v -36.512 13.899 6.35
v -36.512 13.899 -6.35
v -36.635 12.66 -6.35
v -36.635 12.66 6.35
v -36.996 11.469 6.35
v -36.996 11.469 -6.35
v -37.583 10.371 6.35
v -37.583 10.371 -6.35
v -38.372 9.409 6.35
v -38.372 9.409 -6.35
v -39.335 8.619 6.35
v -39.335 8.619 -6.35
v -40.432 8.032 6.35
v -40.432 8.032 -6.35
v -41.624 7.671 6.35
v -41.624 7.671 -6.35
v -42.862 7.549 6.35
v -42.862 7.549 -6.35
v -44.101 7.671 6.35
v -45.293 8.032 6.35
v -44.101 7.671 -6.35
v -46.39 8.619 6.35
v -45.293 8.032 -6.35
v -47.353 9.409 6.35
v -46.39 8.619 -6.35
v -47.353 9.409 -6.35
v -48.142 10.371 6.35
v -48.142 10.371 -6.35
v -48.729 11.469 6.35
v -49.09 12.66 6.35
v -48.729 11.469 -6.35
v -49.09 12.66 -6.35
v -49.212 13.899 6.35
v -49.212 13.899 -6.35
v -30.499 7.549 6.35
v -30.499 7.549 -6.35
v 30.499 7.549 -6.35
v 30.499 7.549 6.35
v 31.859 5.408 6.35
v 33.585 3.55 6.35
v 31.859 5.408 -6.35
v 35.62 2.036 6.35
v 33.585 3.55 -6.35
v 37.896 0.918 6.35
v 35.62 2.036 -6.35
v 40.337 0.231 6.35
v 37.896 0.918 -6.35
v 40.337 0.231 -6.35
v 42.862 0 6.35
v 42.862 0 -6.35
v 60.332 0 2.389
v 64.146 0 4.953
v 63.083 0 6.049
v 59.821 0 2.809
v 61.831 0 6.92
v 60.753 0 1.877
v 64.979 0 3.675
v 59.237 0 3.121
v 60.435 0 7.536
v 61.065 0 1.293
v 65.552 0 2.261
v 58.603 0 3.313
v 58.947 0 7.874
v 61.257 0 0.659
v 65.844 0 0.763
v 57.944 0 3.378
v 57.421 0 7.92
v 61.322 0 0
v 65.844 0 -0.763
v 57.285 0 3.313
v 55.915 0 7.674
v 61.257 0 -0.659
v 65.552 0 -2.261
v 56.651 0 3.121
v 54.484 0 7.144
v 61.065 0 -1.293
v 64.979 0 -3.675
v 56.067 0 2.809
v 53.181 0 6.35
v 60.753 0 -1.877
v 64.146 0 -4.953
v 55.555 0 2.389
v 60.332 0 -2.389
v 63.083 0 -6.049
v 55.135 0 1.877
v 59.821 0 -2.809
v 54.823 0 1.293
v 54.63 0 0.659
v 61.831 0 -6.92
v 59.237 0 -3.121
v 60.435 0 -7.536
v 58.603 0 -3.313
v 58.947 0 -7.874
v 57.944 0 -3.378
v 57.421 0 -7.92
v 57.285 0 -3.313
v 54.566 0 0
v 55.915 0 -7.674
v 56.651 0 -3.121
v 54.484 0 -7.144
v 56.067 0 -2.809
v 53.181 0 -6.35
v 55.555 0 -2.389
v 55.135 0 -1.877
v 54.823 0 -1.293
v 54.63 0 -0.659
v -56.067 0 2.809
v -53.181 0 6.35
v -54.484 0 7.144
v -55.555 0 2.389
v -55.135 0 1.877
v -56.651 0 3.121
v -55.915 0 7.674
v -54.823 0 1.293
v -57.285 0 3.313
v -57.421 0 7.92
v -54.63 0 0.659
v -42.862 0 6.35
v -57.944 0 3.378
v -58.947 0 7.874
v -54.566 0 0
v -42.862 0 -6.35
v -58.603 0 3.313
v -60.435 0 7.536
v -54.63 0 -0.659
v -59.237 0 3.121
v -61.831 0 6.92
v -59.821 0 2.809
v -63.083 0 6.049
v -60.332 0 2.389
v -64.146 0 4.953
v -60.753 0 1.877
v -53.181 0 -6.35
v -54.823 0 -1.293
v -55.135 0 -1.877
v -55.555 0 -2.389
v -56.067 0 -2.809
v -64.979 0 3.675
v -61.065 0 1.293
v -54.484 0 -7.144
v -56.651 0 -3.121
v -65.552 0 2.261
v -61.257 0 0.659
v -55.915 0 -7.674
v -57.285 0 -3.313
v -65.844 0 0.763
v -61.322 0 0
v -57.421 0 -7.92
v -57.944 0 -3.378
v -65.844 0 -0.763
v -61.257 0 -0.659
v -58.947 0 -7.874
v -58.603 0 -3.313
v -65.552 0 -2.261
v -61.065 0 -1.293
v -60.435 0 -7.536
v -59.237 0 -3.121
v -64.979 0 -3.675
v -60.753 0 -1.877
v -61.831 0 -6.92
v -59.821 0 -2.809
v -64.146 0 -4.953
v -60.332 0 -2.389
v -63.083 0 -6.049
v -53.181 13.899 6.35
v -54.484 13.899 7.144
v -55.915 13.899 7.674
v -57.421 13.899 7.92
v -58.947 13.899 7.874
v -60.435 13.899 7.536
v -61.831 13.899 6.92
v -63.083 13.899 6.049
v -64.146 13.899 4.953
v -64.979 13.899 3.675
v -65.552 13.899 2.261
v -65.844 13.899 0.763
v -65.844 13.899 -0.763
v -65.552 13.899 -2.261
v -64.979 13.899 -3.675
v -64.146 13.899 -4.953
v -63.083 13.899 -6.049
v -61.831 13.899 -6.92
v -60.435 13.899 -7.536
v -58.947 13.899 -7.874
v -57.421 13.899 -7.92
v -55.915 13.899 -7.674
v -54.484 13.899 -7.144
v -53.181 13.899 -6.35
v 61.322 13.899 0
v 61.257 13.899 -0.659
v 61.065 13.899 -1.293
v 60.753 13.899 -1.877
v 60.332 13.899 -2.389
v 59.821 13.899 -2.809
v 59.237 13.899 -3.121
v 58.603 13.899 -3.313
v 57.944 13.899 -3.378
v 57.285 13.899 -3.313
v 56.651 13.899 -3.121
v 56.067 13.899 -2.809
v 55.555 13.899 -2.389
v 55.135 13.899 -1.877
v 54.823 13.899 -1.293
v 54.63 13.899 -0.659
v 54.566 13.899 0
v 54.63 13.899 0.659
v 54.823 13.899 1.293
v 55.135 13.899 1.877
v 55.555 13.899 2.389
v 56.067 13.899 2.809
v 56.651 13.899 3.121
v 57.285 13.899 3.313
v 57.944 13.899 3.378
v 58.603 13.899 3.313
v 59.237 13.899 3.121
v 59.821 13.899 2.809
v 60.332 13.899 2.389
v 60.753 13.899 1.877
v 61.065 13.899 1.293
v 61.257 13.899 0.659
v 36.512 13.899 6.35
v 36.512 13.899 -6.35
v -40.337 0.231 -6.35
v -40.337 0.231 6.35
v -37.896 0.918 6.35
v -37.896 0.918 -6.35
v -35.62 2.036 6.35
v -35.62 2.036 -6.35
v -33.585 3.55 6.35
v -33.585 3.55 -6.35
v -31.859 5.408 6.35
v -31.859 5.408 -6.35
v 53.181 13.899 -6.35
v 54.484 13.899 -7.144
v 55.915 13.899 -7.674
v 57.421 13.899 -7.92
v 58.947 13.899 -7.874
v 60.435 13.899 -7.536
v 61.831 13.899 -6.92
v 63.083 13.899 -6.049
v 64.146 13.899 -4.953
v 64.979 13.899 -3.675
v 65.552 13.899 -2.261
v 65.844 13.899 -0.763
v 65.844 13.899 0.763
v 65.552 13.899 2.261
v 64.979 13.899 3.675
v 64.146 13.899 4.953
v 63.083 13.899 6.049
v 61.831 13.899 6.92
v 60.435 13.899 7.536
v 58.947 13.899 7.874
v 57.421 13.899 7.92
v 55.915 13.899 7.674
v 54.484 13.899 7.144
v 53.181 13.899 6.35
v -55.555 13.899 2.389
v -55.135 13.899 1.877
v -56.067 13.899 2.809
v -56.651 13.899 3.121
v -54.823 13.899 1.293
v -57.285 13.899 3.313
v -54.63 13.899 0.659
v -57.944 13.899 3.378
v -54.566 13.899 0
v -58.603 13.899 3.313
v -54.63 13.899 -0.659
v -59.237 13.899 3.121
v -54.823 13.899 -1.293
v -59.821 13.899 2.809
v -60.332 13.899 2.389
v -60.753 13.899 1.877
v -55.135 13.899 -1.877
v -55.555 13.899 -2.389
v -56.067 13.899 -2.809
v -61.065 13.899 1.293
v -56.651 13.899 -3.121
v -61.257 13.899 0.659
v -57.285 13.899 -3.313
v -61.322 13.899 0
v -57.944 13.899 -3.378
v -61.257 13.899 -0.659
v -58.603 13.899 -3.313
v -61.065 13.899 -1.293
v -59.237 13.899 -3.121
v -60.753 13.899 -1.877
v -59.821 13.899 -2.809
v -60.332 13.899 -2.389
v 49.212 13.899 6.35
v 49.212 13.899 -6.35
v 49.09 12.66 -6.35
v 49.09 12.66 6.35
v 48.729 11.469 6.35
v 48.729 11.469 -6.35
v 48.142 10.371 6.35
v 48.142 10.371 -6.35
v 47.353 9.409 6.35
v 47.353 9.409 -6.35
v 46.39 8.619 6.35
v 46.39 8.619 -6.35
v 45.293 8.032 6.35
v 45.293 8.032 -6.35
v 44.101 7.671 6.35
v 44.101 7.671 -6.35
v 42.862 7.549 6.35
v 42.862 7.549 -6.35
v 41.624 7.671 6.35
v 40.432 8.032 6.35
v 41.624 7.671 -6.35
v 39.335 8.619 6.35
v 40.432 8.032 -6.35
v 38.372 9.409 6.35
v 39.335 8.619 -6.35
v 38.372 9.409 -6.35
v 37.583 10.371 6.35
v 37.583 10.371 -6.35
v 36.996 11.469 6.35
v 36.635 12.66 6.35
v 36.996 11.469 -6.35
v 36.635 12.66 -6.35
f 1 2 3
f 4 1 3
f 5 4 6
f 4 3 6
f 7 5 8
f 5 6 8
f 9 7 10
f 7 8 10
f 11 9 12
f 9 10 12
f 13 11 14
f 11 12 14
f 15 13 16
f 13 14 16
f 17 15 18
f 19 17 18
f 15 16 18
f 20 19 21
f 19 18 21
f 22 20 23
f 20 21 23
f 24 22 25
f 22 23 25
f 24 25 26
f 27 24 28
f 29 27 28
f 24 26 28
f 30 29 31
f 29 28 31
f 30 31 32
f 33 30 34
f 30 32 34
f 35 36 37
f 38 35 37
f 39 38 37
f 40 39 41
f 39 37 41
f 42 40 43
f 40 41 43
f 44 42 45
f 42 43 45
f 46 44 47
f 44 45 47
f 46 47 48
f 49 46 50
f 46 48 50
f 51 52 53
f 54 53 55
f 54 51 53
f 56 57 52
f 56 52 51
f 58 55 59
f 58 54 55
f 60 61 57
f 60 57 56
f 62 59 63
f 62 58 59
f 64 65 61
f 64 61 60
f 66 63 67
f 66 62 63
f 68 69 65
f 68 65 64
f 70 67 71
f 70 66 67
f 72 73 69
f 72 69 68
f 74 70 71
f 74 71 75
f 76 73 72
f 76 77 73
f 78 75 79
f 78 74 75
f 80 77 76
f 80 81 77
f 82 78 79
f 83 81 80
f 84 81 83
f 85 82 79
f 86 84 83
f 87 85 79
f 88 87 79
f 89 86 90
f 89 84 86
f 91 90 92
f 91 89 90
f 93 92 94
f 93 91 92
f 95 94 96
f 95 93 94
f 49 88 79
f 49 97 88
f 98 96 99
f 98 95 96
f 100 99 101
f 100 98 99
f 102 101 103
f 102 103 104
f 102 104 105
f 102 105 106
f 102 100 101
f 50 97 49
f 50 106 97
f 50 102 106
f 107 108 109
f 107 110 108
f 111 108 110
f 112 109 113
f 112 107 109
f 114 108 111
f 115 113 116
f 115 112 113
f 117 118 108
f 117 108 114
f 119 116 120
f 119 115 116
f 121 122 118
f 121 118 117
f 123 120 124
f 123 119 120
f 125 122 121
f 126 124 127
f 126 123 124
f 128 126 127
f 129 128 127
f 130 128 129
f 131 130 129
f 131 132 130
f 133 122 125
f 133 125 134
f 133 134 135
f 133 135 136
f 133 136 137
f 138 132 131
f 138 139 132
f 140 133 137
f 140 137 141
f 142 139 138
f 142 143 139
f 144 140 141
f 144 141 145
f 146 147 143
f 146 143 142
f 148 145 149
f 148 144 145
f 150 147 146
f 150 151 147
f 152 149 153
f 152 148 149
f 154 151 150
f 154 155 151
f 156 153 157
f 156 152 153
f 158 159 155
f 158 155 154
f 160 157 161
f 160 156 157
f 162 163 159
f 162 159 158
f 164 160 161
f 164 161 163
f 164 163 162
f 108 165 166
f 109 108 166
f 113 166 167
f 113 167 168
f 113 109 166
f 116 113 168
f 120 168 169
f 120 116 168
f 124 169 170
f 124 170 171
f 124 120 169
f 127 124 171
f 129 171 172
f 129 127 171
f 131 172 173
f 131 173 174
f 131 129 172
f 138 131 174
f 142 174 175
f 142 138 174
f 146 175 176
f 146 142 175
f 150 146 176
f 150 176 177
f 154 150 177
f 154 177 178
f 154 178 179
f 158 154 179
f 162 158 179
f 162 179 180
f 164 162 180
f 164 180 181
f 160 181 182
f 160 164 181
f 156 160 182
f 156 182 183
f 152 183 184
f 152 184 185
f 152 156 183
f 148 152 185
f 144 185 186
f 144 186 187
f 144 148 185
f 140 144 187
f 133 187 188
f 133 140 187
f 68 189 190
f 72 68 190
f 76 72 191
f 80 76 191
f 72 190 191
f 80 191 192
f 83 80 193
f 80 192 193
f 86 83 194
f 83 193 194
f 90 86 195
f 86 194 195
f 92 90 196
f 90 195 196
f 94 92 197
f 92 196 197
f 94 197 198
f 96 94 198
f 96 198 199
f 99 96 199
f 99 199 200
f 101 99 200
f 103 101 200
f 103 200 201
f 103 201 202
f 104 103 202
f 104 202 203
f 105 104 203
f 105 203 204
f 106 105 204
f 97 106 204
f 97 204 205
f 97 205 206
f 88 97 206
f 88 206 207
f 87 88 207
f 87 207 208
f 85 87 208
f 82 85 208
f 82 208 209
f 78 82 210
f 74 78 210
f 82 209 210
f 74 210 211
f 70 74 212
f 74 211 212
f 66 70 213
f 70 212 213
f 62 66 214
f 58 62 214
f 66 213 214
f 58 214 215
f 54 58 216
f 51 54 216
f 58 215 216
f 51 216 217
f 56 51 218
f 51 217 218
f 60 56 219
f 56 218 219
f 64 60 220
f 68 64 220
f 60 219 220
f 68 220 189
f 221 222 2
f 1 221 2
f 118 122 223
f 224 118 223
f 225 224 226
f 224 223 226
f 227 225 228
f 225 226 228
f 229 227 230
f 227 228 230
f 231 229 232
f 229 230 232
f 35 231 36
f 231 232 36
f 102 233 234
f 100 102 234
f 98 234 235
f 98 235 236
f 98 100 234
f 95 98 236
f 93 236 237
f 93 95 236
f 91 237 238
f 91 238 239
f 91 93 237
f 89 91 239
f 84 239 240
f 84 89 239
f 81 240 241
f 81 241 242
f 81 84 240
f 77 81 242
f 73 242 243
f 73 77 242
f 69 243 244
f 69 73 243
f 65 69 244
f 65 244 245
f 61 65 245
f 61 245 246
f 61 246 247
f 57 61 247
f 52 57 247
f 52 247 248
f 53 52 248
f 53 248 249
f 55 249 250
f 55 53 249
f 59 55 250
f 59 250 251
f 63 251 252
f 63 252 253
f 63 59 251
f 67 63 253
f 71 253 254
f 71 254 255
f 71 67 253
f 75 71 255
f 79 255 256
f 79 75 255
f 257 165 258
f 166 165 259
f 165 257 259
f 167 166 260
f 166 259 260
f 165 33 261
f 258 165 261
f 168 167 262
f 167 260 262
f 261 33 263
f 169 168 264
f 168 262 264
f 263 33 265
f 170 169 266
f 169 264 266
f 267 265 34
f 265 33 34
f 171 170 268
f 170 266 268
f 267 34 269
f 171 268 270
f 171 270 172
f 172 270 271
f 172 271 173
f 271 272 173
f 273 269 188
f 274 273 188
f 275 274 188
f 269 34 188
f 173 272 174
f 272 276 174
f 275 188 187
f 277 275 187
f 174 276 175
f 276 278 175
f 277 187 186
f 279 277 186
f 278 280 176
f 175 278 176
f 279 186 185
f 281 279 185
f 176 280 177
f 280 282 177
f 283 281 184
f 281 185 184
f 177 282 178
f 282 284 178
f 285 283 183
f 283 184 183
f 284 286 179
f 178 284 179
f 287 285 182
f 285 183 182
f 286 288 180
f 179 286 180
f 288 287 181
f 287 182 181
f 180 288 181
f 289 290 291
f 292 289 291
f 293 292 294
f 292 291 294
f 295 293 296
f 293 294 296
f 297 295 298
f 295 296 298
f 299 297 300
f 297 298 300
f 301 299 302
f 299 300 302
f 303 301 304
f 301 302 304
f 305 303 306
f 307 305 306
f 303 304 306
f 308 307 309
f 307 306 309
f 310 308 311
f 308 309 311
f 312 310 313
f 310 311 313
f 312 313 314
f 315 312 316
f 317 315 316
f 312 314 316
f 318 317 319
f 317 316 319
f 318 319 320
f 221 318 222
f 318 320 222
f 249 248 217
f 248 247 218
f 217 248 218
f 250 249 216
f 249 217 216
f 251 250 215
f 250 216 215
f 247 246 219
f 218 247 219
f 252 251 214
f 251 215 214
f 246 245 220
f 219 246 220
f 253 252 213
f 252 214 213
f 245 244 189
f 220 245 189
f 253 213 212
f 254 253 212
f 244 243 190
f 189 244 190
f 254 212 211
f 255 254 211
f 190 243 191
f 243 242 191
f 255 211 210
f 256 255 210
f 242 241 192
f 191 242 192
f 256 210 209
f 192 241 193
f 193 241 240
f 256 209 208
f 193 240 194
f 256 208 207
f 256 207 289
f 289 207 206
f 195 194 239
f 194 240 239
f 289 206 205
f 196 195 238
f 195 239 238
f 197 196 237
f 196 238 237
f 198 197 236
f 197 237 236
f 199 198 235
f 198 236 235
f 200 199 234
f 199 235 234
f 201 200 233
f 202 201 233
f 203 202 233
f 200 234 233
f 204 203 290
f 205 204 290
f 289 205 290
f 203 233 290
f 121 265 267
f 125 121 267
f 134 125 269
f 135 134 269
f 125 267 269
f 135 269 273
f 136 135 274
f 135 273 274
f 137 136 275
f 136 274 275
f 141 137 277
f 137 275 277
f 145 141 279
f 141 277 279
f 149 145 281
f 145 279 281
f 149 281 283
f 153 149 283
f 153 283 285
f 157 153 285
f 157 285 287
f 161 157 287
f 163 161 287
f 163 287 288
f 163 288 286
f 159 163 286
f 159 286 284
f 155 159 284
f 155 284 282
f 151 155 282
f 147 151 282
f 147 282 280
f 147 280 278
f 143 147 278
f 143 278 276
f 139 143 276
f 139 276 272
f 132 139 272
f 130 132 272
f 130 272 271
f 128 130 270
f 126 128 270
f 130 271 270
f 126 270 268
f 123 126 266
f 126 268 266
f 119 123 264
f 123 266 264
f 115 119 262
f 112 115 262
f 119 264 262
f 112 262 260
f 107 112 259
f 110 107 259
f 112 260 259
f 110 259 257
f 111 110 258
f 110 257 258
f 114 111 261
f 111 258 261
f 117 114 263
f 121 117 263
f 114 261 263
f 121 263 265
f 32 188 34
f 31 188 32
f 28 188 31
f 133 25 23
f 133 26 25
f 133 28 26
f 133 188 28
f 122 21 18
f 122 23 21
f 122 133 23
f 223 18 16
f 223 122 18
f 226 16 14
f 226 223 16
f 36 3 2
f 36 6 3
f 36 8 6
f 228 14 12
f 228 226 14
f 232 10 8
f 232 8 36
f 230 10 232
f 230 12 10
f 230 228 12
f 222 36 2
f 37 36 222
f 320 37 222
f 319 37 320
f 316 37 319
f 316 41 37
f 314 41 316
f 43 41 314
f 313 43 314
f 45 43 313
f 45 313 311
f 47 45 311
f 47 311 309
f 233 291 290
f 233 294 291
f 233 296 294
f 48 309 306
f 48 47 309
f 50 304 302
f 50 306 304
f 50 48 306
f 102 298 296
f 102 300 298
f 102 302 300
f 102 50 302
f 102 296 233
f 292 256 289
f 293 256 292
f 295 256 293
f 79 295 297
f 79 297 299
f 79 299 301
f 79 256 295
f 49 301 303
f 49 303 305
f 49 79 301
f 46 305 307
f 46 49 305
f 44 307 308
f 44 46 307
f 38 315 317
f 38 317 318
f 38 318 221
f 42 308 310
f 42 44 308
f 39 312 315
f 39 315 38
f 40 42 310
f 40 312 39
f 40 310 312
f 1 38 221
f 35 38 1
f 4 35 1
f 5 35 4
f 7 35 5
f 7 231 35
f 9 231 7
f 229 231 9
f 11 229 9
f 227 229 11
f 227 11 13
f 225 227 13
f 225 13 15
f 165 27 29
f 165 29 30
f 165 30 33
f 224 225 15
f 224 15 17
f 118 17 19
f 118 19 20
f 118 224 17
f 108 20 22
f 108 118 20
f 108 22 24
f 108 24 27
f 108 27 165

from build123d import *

# Parameters (mm, degrees)
BOSS_EXTRUDE1_DEPTH     = 13.89888
CUT_EXTRUDE1_DEPTH      = 69.830593656
CUT_EXTRUDE1_DEPTH_BACK = 69.830593656
CUT_EXTRUDE2_DEPTH      = 69.830593656
F_1_4_CLEARANCE_HOLE1_D = 6.7564


with BuildPart() as part:
    # Sketch1 → Boss-Extrude1 (new body)
    with BuildSketch(Plane(origin=(0, 0, 0), x_dir=(1, 0, 0), z_dir=(0, 1, 0))):
        with BuildLine():
            Line((-53.18125, 6.35), (53.18125, 6.35))
            ThreePointArc((53.18125, 6.35), (65.88125, 0), (53.18125, -6.35))
            Line((53.18125, -6.35), (-53.18125, -6.35))
            ThreePointArc((-53.18125, -6.35), (-65.88125, 0), (-53.18125, 6.35))
        make_face()
    extrude(amount=BOSS_EXTRUDE1_DEPTH)

    # Sketch2 → Cut-Extrude1 (cut, two sides: drawn at the far end of the back side and taken through both)
    with BuildSketch(Plane.XY.offset(6.35).offset(-CUT_EXTRUDE1_DEPTH_BACK)):
        with BuildLine():
            Line((-49.2125, 13.89888), (-36.5125, 13.89888))
            ThreePointArc((-36.5125, 13.89888), (-42.8625, 7.54888), (-49.2125, 13.89888))
        make_face()
        with BuildLine():
            Line((36.5125, 13.89888), (49.2125, 13.89888))
            ThreePointArc((49.2125, 13.89888), (42.8625, 7.54888), (36.5125, 13.89888))
        make_face()
    extrude(amount=CUT_EXTRUDE1_DEPTH + CUT_EXTRUDE1_DEPTH_BACK, mode=Mode.SUBTRACT)

    # Sketch3 → Cut-Extrude2 (cut, through all)
    with BuildSketch(Plane(origin=(0, 0, -6.35), x_dir=(-1, 0, 0), z_dir=(0, 0, -1))):
        with BuildLine():
            Line((30.498990577, 7.54888), (-30.498990577, 7.54888))
            ThreePointArc((-30.498990577, 7.54888), (-35.619538684, 2.036402323), (-42.8625, 0))
            Line((-42.8625, 0), (42.8625, 0))
            ThreePointArc((42.8625, 0), (35.619538684, 2.036402323), (30.498990577, 7.54888))
        make_face()
    extrude(amount=-CUT_EXTRUDE2_DEPTH, mode=Mode.SUBTRACT)

    # 1/4 Clearance Hole1 (through all)
    with Locations(Plane(origin=(0, 0, 0), x_dir=(-1, 0, 0), z_dir=(0, -1, 0))):
        with Locations((57.94375, 0), (-57.94375, 0)):
            Hole(F_1_4_CLEARANCE_HOLE1_D / 2)


solid = part.part
